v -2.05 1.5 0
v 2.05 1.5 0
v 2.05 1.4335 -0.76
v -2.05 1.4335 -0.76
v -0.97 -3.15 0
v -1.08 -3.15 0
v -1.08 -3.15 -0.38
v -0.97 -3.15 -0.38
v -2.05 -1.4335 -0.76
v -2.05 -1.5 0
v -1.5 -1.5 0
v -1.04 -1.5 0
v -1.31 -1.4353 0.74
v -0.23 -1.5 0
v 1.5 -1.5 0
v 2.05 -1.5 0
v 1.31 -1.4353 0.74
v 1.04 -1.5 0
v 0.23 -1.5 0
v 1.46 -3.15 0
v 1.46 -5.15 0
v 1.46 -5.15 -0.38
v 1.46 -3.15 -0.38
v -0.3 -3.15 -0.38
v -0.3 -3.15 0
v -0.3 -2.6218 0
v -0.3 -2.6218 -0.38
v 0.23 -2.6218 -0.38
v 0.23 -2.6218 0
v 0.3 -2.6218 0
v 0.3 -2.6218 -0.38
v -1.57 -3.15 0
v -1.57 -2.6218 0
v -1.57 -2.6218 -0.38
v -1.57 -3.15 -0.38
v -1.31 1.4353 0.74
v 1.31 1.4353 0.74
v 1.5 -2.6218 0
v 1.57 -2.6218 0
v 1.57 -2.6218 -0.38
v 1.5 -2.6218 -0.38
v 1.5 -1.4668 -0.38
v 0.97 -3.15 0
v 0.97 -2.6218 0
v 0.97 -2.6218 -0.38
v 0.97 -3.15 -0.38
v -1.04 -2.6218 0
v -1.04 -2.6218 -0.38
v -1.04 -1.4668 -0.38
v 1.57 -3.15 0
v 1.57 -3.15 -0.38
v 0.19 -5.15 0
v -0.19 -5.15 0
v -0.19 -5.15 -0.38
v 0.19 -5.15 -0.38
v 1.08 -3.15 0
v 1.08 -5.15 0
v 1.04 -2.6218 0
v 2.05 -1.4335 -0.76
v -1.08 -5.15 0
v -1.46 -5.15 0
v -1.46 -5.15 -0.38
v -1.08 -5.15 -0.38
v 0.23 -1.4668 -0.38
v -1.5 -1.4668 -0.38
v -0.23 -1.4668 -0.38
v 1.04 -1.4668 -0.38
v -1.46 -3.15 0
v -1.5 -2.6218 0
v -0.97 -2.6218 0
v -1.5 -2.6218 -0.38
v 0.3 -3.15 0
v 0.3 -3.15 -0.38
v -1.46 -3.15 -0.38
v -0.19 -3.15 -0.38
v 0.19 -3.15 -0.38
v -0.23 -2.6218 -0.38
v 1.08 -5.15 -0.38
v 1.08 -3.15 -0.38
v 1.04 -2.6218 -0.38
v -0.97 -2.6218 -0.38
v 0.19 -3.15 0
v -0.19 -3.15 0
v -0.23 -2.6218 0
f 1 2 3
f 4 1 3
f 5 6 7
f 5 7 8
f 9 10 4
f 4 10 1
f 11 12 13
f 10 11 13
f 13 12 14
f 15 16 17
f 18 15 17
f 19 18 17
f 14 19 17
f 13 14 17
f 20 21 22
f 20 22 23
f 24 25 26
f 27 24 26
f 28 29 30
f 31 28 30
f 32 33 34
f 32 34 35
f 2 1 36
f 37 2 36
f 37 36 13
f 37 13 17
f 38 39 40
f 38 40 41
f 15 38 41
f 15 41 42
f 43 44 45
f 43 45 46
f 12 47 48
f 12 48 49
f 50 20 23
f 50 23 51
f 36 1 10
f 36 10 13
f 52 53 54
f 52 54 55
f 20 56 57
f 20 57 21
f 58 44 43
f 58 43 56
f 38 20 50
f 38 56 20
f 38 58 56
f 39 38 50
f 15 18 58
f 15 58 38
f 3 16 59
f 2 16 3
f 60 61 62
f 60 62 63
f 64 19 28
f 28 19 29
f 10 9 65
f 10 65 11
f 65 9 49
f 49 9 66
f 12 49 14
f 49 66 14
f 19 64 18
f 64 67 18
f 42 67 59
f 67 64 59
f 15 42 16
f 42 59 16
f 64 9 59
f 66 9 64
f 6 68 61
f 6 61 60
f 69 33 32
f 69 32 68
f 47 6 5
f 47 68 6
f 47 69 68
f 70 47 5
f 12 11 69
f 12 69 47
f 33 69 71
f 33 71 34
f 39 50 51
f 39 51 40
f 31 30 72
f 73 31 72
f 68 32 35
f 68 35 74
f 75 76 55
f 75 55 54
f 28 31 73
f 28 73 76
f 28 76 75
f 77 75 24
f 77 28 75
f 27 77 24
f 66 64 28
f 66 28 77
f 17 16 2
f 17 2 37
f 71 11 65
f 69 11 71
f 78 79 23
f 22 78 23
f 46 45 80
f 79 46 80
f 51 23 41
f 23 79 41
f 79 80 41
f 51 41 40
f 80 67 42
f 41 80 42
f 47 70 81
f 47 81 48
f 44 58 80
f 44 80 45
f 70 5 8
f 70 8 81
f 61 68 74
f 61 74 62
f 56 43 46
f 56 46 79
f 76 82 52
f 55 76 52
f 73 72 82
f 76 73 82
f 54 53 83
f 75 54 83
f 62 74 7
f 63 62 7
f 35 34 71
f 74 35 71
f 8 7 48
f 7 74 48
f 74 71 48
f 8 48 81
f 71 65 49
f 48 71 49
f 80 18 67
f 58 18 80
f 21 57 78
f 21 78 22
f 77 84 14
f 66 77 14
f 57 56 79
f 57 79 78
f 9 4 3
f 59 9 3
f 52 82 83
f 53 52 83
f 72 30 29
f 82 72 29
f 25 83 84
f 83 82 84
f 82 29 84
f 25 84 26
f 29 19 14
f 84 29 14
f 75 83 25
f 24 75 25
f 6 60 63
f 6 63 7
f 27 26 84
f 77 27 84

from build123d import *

# Parameters (mm, degrees)
SKETCH1_W                = 4.1
SKETCH1_H                = 3
EXTRUDE1_DEPTH           = 0.74
EXTRUDE1_TAPER           = 5
EXTRUDE1_OTHER_WAY_DEPTH = 0.76
CUT_EXTRUDE1_DEPTH       = 2.5
CUT_EXTRUDE1_DEPTH_BACK  = 2.5
CUT_EXTRUDE2_DEPTH       = 3.05
CUT_EXTRUDE2_DEPTH_BACK  = 3.05
EXTRUDE2_DEPTH           = 0.38


with BuildPart() as part:
    # Sketch1 → Extrude1 (new body)
    with BuildSketch(Plane.XY):
        Rectangle(SKETCH1_W, SKETCH1_H)
    extrude(amount=EXTRUDE1_DEPTH, taper=EXTRUDE1_TAPER)

    # Sketch1 → Extrude1 other way (add)
    with BuildSketch(Plane.XY):
        Rectangle(SKETCH1_W, SKETCH1_H)
    extrude(amount=-EXTRUDE1_OTHER_WAY_DEPTH)

    # Sketch2 → Cut-Extrude1 (cut, two sides)
    with BuildSketch(Plane(origin=(0, 0, 0), x_dir=(1, 0, 0), z_dir=(0, 1, 0))) as cut_extrude1_sk:
        Polygon((-2.05, 0), (-1.022969854, -1.027030146), (-2.05, -1.027030146), align=None)
        Polygon((2.05, 0), (1.060614086, -0.989385914), (2.05, -0.989385914), align=None)
    extrude(amount=CUT_EXTRUDE1_DEPTH, mode=Mode.SUBTRACT)
    extrude(cut_extrude1_sk.sketch, amount=-CUT_EXTRUDE1_DEPTH_BACK, mode=Mode.SUBTRACT)

    # Sketch3 → Cut-Extrude2 (cut, two sides)
    with BuildSketch(Plane(origin=(0, 0, 0), x_dir=(0, 0, -1), z_dir=(1, 0, 0))) as cut_extrude2_sk:
        Polygon((0, 1.5), (1.212386466, 1.393929928), (0.76, 1.5), align=None)
        Polygon((0, -1.5), (1.104320803, -1.5), (1.104320803, -1.403384449), align=None)
    extrude(amount=CUT_EXTRUDE2_DEPTH, mode=Mode.SUBTRACT)
    extrude(cut_extrude2_sk.sketch, amount=-CUT_EXTRUDE2_DEPTH_BACK, mode=Mode.SUBTRACT)

    # Sketch4 → Extrude2 (add)
    with BuildSketch(Plane.XY):
        Polygon((1.46, -3.15), (1.57, -3.15), (1.57, -2.62177976), (1.5, -2.62177976), (1.5, -0.78753646), (1.04, -0.78753646), (1.04, -2.62177976), (0.97, -2.62177976), (0.97, -3.15), (1.08, -3.15), (1.08, -5.15), (1.27, -5.15), (1.46, -5.15), align=None)
        Polygon((-1.08, -3.15), (-0.97, -3.15), (-0.97, -2.62177976), (-1.04, -2.62177976), (-1.04, -0.78753646), (-1.5, -0.78753646), (-1.5, -2.62177976), (-1.57, -2.62177976), (-1.57, -3.15), (-1.46, -3.15), (-1.46, -5.15), (-1.27, -5.15), (-1.08, -5.15), align=None)
        Polygon((0.23, -2.62177976), (0.3, -2.62177976), (0.3, -3.15), (0.19, -3.15), (0.19, -5.15), (0, -5.15), (-0.19, -5.15), (-0.19, -3.15), (-0.3, -3.15), (-0.3, -2.62177976), (-0.23, -2.62177976), (-0.23, -0.78753646), (0.23, -0.78753646), align=None)
    extrude(amount=-EXTRUDE2_DEPTH)


solid = part.part
